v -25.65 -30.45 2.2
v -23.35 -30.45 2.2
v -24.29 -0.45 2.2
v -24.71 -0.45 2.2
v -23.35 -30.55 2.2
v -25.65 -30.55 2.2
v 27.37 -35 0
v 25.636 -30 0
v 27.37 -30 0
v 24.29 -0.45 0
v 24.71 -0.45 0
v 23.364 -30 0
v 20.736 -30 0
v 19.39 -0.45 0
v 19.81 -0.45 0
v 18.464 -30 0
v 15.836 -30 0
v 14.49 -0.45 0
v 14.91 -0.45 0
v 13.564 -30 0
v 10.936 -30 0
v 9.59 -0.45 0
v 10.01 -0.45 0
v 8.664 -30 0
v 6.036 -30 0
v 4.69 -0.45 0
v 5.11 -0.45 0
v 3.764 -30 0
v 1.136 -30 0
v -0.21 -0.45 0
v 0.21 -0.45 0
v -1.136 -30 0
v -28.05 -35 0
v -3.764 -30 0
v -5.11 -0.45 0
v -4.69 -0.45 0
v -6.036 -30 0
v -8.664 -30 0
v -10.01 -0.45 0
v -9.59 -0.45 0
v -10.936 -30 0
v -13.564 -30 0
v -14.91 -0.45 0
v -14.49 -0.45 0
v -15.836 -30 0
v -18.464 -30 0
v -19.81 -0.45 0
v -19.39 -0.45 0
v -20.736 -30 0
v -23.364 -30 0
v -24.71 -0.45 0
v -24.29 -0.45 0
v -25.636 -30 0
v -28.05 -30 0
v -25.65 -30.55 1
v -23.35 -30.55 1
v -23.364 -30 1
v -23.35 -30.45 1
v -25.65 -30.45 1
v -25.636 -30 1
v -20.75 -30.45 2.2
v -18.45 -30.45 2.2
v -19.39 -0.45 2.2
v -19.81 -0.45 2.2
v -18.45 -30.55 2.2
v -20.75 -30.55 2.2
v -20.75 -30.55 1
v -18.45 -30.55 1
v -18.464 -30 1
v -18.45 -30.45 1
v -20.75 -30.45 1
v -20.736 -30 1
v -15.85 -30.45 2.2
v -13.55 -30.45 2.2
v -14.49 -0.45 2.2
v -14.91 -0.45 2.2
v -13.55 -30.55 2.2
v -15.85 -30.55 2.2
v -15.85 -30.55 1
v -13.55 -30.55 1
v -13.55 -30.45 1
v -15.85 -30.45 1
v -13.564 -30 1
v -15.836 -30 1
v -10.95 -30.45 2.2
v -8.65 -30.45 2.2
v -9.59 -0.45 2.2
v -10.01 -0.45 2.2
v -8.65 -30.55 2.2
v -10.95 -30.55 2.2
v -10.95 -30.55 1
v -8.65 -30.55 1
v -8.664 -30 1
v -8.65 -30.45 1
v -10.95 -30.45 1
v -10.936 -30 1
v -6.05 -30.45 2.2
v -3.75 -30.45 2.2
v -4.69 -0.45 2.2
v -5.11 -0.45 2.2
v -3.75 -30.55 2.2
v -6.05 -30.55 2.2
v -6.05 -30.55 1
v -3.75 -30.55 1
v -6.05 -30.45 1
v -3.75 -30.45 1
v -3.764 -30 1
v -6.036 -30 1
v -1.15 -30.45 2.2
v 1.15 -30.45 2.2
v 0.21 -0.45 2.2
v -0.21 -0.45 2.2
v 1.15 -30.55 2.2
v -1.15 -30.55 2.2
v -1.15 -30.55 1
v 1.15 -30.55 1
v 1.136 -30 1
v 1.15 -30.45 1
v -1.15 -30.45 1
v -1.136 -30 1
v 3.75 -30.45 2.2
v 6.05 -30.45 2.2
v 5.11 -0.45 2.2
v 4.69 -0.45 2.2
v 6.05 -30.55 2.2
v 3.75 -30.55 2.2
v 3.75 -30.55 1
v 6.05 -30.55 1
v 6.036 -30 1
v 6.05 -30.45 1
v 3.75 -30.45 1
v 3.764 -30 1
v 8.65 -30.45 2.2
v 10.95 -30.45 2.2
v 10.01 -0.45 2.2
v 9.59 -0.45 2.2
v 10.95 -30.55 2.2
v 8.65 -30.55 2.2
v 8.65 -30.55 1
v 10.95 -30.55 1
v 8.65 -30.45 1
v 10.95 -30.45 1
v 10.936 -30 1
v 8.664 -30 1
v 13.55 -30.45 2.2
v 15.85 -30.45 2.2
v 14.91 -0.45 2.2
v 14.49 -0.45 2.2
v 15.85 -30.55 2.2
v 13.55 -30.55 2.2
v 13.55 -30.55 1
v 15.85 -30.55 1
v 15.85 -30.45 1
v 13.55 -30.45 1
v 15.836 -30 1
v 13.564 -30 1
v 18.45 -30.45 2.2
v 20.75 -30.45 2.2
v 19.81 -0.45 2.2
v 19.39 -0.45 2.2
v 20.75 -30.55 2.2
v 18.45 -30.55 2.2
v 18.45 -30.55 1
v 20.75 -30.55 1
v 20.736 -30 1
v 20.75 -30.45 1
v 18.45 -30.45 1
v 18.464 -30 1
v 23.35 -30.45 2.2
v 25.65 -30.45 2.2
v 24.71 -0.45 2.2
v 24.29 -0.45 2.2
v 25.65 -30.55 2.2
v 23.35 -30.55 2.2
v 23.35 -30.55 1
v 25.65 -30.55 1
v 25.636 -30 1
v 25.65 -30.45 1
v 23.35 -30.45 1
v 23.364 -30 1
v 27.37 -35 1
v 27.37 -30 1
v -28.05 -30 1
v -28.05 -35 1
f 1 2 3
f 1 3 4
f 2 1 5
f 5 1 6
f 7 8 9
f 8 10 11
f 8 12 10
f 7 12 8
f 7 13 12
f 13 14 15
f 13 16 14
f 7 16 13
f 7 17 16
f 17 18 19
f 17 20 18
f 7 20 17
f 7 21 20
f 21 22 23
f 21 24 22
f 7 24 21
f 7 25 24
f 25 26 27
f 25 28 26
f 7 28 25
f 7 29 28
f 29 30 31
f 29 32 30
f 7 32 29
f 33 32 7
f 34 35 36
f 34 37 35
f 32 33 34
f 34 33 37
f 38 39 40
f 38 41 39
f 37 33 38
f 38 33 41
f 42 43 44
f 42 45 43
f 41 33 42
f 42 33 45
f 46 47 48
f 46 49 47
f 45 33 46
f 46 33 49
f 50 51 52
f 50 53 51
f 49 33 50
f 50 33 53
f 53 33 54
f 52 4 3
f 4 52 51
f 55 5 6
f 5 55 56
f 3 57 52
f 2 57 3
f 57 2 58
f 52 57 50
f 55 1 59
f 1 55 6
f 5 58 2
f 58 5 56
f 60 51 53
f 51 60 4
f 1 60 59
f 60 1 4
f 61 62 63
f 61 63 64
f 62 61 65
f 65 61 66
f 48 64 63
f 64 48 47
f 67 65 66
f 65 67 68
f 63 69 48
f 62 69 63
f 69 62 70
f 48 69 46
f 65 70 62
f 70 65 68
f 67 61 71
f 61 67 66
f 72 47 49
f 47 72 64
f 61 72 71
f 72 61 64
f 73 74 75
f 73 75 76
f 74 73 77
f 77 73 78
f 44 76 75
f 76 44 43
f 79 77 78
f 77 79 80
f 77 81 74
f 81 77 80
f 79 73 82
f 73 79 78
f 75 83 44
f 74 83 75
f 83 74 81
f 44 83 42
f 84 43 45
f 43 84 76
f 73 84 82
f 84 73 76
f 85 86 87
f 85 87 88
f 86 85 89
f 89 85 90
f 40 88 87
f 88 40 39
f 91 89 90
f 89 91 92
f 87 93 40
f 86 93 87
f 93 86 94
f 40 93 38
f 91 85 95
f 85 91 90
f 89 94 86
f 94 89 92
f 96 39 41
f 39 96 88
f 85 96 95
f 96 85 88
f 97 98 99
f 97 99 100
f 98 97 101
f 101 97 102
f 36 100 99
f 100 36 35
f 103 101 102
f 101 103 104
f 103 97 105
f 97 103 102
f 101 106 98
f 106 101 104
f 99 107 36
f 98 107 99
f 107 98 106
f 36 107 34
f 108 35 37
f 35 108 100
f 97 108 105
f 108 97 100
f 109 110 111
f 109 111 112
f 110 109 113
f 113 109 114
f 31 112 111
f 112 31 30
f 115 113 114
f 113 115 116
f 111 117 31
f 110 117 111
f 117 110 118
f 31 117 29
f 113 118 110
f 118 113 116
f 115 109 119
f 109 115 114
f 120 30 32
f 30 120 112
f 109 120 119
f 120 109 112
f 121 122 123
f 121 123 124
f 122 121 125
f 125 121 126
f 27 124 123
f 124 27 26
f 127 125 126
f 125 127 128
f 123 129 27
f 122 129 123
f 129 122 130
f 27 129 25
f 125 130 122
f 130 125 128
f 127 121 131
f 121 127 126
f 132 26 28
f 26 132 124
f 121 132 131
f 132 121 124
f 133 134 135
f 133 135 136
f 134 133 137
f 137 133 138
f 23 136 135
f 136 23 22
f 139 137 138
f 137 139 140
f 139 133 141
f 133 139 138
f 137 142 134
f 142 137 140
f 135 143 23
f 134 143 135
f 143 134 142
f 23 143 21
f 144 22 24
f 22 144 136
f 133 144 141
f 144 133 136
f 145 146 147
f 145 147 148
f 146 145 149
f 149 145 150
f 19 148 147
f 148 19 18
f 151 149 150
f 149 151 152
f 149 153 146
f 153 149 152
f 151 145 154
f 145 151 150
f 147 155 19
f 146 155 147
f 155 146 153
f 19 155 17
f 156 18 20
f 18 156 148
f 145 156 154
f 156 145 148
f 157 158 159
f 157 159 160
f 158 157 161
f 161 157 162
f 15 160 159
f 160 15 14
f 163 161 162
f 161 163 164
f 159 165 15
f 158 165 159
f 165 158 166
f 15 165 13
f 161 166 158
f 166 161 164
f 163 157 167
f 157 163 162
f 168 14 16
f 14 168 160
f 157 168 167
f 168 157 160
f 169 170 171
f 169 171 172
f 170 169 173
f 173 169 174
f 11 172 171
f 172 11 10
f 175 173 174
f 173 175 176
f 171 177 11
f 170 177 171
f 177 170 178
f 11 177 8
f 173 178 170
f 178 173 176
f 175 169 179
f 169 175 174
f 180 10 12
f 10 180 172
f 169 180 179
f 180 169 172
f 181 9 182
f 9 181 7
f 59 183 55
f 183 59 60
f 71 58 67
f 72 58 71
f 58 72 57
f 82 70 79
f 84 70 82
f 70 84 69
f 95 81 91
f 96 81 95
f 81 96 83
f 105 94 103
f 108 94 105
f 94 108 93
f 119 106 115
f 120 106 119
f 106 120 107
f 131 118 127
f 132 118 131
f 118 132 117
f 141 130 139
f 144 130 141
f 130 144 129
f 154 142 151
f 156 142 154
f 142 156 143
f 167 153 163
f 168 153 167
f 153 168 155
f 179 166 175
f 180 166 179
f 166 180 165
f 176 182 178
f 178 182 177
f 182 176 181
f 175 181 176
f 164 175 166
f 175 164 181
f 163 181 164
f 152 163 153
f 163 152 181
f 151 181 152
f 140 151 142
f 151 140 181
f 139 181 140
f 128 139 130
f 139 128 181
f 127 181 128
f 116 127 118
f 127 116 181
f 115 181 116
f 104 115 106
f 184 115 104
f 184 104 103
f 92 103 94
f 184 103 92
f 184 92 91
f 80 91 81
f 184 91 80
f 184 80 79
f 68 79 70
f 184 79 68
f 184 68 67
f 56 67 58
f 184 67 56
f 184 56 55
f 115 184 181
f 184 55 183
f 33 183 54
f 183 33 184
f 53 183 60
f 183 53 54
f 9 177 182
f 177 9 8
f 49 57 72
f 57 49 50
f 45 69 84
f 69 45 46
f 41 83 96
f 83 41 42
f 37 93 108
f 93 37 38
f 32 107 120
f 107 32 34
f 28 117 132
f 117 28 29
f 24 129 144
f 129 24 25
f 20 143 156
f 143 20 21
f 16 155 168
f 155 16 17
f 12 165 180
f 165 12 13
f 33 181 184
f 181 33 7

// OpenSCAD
/*
Calibration print for tool offsets for an Dual Independent X axis (IDEX) printer such as the experimental BigBox Idex:
https://forum.e3d-online.com/index.php?threads/bigbox-dual-x-carriages.2184/

This use this to generate two seperate STL files, I with regular spaced lines on X and Y
1 with varyingly spaced lines.

Selecting which lines on X and Y most closely match will alow you to determine the tool offset accurately.
e.g.
3 lines spaced 10 mm apart, located with 3 lines centered at the middle and spaced at 9.5 and 10.5 either side. If the 10.5 line is lined up the the second head is 0.5-, if the 9.5 line lines up it is 0.5+ of the center line. For best results extend the number of lines and reduce the size of the spacing.

You may need a course and fine test, 1 to get within 0.5mm and one to get <0.05mm

*/

numLines = 11; //number of calibration lines must be an odd number
lineSpacing = 5; //line spacing in mm for the regular lines
variation = 0.1; // step for varying lines
lineHeight = 2.2; //set to your calibration layer height.
lineWidth = 0.42; //set to the first layer line width your slicer generates
lineLength = 30;  //the length of the printed lines
solidLength=5;    //the length of the solid box holding the lines together
solidHeight=1;    //the height of the solid box holding the lines together
gap=1;


module regularGrid() {
    for(i=[-((numLines-1)/2) : 1 : ((numLines-1)/2)]){
        translate([i*lineSpacing ,gap/2,lineHeight/2])
        color("black") 
        hull() {
            cube([lineWidth,0.1,lineHeight],center=true);
            translate([0,lineLength,0])
                cube([lineSpacing/2-0.2,0.1,lineHeight],center=true);
        }
    }
    translate([-((numLines)/2)*lineSpacing, lineLength + 0*gap, 0])
       cube([numLines*lineSpacing+lineWidth, solidLength, solidHeight]);
}

module varyingGrid() {
    for(i=[-((numLines-1)/2): 1 : ((numLines-1)/2)]){
        translate([i*lineSpacing-variation*i,-gap/2,lineHeight/2])
        color("red")
        hull(){
            cube([lineWidth,0.1,lineHeight],center=true);
            translate([0,-lineLength,0])
                cube([lineSpacing/2-0.2,0.1,lineHeight],center=true);
        }
    }
    translate([-((numLines)/2)*(lineSpacing+variation), -(lineLength + 0*gap) - solidLength, 0])
       cube([numLines*lineSpacing+lineWidth, solidLength, solidHeight]);    
}

//create STLs for regular and varying grid seperately anc combine them in your slicer
//regularGrid();
varyingGrid();
